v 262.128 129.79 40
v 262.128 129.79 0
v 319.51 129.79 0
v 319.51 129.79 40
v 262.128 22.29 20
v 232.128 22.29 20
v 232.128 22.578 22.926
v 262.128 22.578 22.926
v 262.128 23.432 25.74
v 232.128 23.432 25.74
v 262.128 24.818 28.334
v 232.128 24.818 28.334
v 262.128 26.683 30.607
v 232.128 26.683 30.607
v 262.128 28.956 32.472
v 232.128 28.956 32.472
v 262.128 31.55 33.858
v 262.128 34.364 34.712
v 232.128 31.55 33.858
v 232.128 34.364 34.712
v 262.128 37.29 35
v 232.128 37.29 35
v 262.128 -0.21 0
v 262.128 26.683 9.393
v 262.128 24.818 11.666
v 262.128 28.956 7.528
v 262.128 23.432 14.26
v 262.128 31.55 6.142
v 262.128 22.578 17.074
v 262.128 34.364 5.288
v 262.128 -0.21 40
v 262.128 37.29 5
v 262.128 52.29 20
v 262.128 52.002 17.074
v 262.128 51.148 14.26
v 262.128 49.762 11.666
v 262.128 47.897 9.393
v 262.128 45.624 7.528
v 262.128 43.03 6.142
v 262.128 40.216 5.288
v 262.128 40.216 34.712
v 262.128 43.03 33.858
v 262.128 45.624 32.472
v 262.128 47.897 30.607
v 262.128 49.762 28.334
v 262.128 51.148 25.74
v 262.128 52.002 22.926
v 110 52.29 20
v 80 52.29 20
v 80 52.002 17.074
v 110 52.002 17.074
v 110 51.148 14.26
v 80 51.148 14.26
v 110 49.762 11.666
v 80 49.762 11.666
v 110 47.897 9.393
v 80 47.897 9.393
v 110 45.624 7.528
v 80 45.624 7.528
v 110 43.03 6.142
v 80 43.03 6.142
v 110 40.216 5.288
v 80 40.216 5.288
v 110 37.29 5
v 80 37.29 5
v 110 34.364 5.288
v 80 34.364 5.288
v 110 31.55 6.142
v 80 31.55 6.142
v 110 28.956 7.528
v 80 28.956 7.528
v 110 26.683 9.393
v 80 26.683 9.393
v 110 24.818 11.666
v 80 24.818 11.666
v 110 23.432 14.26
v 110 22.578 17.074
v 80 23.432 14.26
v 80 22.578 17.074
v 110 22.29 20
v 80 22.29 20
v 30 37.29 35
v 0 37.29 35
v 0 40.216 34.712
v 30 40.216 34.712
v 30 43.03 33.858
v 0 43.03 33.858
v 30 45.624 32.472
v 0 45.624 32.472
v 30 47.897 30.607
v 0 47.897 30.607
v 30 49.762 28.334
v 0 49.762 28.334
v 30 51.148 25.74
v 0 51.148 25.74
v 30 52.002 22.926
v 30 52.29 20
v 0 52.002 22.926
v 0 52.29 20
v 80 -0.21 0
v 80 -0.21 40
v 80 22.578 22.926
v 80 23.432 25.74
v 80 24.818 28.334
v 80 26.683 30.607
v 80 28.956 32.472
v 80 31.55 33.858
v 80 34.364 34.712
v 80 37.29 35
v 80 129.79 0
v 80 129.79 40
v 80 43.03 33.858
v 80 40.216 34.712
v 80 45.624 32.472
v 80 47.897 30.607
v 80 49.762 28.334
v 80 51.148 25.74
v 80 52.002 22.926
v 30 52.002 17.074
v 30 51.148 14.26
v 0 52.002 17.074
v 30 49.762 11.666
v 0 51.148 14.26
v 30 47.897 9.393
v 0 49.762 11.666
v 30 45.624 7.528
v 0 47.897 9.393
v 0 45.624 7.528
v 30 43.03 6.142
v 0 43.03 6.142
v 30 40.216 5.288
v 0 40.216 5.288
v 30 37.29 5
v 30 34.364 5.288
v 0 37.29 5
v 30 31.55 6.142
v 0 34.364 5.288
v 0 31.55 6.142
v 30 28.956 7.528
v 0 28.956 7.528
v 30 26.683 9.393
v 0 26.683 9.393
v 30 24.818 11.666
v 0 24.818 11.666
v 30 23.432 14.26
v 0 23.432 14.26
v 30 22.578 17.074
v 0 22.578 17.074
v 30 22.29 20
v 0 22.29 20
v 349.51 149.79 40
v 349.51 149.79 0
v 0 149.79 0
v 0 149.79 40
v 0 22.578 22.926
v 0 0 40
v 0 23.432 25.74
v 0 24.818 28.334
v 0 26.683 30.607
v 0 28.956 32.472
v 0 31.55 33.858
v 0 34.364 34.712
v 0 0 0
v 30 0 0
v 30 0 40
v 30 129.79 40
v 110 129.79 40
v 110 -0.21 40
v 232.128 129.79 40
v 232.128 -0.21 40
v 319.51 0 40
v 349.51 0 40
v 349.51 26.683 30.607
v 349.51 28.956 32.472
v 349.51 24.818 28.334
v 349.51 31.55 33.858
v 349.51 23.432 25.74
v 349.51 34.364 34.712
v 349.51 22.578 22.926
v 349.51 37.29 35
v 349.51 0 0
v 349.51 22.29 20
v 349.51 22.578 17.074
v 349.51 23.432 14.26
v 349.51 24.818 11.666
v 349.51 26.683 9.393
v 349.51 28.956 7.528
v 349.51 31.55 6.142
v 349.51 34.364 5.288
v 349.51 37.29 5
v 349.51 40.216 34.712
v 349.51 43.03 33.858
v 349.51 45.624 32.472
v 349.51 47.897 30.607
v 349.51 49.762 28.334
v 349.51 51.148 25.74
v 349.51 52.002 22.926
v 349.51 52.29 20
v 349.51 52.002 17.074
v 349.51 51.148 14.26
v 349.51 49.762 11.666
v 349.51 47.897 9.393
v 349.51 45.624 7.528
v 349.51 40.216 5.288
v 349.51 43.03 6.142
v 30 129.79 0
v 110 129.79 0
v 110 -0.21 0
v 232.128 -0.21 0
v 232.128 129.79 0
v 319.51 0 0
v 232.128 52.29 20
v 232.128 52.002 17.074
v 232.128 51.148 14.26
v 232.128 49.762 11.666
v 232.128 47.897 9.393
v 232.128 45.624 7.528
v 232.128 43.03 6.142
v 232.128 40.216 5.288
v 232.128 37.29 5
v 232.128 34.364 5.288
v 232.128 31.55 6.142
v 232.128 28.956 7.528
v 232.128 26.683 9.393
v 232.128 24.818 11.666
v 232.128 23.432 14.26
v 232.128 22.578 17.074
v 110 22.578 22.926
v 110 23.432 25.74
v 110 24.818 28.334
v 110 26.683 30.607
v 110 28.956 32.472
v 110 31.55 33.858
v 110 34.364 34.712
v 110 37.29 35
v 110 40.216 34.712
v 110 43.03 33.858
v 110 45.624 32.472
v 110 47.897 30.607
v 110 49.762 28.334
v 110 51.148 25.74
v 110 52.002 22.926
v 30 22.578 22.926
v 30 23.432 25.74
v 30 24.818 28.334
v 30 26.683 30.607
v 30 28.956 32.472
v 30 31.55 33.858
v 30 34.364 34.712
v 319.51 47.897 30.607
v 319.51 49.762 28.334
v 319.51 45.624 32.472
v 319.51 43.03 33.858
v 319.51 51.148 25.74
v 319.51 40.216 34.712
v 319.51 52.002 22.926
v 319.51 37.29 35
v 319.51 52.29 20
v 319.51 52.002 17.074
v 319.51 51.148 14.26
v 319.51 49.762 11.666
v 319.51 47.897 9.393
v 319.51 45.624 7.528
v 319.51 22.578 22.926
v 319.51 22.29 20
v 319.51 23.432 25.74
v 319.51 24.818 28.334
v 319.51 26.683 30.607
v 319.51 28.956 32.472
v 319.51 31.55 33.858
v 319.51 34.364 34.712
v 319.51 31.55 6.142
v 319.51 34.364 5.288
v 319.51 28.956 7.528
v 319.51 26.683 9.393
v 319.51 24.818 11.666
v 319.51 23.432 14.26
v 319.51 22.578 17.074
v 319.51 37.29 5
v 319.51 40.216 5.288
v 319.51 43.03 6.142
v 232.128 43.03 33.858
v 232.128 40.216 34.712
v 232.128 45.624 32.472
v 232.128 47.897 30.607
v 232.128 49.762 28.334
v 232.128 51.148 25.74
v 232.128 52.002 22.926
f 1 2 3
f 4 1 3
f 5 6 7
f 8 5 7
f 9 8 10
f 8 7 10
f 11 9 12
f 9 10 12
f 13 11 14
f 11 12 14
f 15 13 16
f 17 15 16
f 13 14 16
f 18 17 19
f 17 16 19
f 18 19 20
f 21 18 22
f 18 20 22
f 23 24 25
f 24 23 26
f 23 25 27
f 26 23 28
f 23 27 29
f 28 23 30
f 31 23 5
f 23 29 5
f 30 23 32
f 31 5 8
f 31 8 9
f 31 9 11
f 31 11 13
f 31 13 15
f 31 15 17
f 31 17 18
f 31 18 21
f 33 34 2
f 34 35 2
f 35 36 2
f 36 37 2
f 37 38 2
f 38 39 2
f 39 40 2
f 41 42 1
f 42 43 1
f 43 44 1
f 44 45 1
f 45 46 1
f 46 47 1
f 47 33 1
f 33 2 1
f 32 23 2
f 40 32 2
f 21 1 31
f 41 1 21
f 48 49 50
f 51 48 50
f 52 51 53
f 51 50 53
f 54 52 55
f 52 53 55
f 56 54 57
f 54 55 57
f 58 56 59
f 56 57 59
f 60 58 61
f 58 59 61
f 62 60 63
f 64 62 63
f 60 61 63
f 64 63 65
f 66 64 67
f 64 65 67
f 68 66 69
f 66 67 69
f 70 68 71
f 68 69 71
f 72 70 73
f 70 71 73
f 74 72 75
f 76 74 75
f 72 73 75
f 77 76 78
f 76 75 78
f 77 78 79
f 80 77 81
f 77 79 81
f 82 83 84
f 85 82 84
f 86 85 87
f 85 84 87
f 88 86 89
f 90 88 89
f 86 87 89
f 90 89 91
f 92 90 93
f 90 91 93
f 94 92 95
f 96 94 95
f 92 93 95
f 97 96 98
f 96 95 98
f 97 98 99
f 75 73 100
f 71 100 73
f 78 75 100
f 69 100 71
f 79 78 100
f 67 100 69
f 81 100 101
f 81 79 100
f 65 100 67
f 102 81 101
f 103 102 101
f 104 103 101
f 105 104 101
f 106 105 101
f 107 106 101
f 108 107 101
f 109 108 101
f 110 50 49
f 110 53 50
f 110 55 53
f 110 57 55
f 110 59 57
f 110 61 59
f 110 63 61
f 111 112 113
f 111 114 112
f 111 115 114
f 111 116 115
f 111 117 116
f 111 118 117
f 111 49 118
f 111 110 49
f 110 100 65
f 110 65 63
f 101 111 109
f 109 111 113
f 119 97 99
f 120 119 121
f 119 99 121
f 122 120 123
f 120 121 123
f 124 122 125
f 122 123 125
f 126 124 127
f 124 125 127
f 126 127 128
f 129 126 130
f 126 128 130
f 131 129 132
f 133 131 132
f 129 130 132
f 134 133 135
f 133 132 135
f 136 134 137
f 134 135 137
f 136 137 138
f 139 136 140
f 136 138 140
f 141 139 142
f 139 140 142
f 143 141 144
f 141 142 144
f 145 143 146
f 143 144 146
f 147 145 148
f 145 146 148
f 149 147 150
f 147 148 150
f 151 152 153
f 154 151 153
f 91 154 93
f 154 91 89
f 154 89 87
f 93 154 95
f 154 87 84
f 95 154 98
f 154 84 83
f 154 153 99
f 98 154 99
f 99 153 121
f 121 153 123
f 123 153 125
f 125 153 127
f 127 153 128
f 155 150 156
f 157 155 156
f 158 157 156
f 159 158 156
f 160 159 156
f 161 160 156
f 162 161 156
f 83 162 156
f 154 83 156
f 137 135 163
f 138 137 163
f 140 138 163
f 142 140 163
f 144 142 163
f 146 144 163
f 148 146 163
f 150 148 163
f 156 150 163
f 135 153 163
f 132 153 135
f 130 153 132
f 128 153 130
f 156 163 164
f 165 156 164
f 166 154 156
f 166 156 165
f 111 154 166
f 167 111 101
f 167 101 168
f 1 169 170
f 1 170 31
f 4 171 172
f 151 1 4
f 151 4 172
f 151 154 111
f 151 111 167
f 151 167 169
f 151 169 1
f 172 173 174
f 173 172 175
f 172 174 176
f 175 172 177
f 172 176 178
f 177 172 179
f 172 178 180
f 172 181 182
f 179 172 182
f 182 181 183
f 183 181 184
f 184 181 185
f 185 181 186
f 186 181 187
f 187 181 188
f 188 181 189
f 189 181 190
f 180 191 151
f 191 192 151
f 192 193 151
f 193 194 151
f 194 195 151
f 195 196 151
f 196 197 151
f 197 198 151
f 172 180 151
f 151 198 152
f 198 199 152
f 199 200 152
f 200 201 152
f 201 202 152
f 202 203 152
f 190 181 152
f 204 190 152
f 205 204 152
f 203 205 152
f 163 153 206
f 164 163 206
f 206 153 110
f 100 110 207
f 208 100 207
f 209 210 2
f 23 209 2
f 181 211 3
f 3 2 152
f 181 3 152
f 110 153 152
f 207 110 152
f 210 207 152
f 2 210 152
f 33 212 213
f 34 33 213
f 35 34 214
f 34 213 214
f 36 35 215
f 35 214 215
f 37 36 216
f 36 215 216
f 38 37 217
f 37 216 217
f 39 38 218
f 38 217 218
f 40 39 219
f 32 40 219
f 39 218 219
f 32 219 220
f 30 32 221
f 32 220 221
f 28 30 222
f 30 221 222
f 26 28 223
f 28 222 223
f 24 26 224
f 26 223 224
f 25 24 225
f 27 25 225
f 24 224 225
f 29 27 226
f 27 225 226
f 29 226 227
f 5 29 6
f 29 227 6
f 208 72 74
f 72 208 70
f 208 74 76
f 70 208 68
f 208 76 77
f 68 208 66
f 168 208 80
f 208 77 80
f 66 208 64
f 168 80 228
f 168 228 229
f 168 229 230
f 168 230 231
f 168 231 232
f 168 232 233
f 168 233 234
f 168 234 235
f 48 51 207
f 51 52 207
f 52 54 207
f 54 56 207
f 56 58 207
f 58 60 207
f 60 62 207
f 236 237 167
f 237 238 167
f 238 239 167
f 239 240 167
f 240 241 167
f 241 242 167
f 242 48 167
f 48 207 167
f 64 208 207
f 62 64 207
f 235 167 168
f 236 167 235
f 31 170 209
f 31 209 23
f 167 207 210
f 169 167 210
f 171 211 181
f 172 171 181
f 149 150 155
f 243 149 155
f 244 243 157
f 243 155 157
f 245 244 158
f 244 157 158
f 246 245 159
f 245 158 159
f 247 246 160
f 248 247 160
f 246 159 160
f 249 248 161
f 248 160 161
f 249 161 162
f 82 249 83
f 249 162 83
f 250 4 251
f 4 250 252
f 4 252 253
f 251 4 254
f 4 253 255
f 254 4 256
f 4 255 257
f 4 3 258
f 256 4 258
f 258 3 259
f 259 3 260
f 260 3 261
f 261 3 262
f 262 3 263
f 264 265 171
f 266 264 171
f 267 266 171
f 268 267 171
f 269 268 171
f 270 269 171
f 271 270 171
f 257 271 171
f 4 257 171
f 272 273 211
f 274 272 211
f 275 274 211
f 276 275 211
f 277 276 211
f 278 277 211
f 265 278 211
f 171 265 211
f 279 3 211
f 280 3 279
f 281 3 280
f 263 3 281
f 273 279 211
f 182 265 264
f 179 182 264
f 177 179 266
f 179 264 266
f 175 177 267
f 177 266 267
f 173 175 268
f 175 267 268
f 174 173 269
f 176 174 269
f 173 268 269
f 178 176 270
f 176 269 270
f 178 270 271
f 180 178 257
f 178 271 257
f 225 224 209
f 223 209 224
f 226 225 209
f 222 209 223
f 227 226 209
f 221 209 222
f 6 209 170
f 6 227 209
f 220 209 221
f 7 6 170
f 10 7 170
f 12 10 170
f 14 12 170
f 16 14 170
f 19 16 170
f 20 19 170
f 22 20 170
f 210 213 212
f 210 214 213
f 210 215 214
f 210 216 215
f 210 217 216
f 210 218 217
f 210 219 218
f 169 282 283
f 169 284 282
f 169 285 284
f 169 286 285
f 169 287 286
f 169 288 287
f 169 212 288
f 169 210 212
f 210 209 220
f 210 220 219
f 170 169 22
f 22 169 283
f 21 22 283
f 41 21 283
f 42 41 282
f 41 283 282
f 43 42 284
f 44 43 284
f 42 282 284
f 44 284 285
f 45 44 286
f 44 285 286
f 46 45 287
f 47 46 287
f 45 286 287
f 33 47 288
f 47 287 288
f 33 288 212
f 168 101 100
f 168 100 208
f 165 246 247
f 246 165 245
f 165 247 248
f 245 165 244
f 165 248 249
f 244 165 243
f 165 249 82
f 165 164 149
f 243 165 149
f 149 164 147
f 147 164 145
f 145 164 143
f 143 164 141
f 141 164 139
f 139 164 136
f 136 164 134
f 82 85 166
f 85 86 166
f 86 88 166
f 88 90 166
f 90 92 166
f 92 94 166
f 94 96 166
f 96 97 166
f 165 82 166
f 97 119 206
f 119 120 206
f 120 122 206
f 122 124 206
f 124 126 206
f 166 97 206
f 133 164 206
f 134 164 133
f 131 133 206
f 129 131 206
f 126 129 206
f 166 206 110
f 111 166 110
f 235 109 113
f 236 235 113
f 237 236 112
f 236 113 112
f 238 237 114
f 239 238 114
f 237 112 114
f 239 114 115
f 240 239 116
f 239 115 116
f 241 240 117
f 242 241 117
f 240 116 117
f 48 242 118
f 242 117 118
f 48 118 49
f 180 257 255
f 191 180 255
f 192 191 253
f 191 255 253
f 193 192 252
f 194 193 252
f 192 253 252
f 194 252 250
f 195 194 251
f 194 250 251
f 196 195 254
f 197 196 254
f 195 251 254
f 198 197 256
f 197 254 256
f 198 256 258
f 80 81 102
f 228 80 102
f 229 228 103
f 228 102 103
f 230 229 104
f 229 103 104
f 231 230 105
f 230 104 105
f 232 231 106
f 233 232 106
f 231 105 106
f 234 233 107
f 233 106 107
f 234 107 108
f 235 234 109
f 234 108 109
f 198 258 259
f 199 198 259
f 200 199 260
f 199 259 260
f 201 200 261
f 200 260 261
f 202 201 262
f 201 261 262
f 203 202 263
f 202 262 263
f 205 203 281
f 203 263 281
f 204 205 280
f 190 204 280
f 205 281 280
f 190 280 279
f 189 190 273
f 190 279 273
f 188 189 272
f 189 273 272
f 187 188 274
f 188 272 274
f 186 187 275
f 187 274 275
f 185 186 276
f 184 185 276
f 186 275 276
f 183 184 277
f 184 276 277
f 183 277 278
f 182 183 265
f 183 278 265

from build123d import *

# Parameters (mm, degrees)
BOSS_EXTRUDE1_DEPTH = 40
SKETCH2_W           = 30
SKETCH2_H           = 40
BOSS_EXTRUDE2_DEPTH = 130
CUT_EXTRUDE1_DEPTH  = 410


with BuildPart() as part:
    # Sketch1 → Boss-Extrude1 (new body)
    with BuildSketch(Plane.XY):
        Polygon((0, 149.79), (0, 0), (30, 0), (30, 129.79), (319.51, 129.79), (319.51, 0), (349.51, 0), (349.51, 149.79), align=None)
    extrude(amount=BOSS_EXTRUDE1_DEPTH)

    # Sketch2 → Boss-Extrude2 (add)
    with BuildSketch(Plane.XZ.offset(-129.79)):
        with Locations((95, 20)):
            Rectangle(SKETCH2_W, SKETCH2_H)
        with Locations((247.128263463, 20)):
            Rectangle(SKETCH2_W, SKETCH2_H)
    extrude(amount=BOSS_EXTRUDE2_DEPTH)

    # Sketch4 → Cut-Extrude1 (cut)
    with BuildSketch(Plane.ZY):
        with BuildLine():
            ThreePointArc((20, 52.29), (5, 37.29), (20, 22.29))
            Line((20, 22.29), (20, 52.29))
        make_face()
        with BuildLine():
            Line((20, 52.29), (20, 22.29))
            ThreePointArc((20, 22.29), (30.606601718, 26.683398282), (35, 37.29))
            ThreePointArc((35, 37.29), (30.606601718, 47.896601718), (20, 52.29))
        make_face()
    extrude(amount=-CUT_EXTRUDE1_DEPTH, mode=Mode.SUBTRACT)


solid = part.part
